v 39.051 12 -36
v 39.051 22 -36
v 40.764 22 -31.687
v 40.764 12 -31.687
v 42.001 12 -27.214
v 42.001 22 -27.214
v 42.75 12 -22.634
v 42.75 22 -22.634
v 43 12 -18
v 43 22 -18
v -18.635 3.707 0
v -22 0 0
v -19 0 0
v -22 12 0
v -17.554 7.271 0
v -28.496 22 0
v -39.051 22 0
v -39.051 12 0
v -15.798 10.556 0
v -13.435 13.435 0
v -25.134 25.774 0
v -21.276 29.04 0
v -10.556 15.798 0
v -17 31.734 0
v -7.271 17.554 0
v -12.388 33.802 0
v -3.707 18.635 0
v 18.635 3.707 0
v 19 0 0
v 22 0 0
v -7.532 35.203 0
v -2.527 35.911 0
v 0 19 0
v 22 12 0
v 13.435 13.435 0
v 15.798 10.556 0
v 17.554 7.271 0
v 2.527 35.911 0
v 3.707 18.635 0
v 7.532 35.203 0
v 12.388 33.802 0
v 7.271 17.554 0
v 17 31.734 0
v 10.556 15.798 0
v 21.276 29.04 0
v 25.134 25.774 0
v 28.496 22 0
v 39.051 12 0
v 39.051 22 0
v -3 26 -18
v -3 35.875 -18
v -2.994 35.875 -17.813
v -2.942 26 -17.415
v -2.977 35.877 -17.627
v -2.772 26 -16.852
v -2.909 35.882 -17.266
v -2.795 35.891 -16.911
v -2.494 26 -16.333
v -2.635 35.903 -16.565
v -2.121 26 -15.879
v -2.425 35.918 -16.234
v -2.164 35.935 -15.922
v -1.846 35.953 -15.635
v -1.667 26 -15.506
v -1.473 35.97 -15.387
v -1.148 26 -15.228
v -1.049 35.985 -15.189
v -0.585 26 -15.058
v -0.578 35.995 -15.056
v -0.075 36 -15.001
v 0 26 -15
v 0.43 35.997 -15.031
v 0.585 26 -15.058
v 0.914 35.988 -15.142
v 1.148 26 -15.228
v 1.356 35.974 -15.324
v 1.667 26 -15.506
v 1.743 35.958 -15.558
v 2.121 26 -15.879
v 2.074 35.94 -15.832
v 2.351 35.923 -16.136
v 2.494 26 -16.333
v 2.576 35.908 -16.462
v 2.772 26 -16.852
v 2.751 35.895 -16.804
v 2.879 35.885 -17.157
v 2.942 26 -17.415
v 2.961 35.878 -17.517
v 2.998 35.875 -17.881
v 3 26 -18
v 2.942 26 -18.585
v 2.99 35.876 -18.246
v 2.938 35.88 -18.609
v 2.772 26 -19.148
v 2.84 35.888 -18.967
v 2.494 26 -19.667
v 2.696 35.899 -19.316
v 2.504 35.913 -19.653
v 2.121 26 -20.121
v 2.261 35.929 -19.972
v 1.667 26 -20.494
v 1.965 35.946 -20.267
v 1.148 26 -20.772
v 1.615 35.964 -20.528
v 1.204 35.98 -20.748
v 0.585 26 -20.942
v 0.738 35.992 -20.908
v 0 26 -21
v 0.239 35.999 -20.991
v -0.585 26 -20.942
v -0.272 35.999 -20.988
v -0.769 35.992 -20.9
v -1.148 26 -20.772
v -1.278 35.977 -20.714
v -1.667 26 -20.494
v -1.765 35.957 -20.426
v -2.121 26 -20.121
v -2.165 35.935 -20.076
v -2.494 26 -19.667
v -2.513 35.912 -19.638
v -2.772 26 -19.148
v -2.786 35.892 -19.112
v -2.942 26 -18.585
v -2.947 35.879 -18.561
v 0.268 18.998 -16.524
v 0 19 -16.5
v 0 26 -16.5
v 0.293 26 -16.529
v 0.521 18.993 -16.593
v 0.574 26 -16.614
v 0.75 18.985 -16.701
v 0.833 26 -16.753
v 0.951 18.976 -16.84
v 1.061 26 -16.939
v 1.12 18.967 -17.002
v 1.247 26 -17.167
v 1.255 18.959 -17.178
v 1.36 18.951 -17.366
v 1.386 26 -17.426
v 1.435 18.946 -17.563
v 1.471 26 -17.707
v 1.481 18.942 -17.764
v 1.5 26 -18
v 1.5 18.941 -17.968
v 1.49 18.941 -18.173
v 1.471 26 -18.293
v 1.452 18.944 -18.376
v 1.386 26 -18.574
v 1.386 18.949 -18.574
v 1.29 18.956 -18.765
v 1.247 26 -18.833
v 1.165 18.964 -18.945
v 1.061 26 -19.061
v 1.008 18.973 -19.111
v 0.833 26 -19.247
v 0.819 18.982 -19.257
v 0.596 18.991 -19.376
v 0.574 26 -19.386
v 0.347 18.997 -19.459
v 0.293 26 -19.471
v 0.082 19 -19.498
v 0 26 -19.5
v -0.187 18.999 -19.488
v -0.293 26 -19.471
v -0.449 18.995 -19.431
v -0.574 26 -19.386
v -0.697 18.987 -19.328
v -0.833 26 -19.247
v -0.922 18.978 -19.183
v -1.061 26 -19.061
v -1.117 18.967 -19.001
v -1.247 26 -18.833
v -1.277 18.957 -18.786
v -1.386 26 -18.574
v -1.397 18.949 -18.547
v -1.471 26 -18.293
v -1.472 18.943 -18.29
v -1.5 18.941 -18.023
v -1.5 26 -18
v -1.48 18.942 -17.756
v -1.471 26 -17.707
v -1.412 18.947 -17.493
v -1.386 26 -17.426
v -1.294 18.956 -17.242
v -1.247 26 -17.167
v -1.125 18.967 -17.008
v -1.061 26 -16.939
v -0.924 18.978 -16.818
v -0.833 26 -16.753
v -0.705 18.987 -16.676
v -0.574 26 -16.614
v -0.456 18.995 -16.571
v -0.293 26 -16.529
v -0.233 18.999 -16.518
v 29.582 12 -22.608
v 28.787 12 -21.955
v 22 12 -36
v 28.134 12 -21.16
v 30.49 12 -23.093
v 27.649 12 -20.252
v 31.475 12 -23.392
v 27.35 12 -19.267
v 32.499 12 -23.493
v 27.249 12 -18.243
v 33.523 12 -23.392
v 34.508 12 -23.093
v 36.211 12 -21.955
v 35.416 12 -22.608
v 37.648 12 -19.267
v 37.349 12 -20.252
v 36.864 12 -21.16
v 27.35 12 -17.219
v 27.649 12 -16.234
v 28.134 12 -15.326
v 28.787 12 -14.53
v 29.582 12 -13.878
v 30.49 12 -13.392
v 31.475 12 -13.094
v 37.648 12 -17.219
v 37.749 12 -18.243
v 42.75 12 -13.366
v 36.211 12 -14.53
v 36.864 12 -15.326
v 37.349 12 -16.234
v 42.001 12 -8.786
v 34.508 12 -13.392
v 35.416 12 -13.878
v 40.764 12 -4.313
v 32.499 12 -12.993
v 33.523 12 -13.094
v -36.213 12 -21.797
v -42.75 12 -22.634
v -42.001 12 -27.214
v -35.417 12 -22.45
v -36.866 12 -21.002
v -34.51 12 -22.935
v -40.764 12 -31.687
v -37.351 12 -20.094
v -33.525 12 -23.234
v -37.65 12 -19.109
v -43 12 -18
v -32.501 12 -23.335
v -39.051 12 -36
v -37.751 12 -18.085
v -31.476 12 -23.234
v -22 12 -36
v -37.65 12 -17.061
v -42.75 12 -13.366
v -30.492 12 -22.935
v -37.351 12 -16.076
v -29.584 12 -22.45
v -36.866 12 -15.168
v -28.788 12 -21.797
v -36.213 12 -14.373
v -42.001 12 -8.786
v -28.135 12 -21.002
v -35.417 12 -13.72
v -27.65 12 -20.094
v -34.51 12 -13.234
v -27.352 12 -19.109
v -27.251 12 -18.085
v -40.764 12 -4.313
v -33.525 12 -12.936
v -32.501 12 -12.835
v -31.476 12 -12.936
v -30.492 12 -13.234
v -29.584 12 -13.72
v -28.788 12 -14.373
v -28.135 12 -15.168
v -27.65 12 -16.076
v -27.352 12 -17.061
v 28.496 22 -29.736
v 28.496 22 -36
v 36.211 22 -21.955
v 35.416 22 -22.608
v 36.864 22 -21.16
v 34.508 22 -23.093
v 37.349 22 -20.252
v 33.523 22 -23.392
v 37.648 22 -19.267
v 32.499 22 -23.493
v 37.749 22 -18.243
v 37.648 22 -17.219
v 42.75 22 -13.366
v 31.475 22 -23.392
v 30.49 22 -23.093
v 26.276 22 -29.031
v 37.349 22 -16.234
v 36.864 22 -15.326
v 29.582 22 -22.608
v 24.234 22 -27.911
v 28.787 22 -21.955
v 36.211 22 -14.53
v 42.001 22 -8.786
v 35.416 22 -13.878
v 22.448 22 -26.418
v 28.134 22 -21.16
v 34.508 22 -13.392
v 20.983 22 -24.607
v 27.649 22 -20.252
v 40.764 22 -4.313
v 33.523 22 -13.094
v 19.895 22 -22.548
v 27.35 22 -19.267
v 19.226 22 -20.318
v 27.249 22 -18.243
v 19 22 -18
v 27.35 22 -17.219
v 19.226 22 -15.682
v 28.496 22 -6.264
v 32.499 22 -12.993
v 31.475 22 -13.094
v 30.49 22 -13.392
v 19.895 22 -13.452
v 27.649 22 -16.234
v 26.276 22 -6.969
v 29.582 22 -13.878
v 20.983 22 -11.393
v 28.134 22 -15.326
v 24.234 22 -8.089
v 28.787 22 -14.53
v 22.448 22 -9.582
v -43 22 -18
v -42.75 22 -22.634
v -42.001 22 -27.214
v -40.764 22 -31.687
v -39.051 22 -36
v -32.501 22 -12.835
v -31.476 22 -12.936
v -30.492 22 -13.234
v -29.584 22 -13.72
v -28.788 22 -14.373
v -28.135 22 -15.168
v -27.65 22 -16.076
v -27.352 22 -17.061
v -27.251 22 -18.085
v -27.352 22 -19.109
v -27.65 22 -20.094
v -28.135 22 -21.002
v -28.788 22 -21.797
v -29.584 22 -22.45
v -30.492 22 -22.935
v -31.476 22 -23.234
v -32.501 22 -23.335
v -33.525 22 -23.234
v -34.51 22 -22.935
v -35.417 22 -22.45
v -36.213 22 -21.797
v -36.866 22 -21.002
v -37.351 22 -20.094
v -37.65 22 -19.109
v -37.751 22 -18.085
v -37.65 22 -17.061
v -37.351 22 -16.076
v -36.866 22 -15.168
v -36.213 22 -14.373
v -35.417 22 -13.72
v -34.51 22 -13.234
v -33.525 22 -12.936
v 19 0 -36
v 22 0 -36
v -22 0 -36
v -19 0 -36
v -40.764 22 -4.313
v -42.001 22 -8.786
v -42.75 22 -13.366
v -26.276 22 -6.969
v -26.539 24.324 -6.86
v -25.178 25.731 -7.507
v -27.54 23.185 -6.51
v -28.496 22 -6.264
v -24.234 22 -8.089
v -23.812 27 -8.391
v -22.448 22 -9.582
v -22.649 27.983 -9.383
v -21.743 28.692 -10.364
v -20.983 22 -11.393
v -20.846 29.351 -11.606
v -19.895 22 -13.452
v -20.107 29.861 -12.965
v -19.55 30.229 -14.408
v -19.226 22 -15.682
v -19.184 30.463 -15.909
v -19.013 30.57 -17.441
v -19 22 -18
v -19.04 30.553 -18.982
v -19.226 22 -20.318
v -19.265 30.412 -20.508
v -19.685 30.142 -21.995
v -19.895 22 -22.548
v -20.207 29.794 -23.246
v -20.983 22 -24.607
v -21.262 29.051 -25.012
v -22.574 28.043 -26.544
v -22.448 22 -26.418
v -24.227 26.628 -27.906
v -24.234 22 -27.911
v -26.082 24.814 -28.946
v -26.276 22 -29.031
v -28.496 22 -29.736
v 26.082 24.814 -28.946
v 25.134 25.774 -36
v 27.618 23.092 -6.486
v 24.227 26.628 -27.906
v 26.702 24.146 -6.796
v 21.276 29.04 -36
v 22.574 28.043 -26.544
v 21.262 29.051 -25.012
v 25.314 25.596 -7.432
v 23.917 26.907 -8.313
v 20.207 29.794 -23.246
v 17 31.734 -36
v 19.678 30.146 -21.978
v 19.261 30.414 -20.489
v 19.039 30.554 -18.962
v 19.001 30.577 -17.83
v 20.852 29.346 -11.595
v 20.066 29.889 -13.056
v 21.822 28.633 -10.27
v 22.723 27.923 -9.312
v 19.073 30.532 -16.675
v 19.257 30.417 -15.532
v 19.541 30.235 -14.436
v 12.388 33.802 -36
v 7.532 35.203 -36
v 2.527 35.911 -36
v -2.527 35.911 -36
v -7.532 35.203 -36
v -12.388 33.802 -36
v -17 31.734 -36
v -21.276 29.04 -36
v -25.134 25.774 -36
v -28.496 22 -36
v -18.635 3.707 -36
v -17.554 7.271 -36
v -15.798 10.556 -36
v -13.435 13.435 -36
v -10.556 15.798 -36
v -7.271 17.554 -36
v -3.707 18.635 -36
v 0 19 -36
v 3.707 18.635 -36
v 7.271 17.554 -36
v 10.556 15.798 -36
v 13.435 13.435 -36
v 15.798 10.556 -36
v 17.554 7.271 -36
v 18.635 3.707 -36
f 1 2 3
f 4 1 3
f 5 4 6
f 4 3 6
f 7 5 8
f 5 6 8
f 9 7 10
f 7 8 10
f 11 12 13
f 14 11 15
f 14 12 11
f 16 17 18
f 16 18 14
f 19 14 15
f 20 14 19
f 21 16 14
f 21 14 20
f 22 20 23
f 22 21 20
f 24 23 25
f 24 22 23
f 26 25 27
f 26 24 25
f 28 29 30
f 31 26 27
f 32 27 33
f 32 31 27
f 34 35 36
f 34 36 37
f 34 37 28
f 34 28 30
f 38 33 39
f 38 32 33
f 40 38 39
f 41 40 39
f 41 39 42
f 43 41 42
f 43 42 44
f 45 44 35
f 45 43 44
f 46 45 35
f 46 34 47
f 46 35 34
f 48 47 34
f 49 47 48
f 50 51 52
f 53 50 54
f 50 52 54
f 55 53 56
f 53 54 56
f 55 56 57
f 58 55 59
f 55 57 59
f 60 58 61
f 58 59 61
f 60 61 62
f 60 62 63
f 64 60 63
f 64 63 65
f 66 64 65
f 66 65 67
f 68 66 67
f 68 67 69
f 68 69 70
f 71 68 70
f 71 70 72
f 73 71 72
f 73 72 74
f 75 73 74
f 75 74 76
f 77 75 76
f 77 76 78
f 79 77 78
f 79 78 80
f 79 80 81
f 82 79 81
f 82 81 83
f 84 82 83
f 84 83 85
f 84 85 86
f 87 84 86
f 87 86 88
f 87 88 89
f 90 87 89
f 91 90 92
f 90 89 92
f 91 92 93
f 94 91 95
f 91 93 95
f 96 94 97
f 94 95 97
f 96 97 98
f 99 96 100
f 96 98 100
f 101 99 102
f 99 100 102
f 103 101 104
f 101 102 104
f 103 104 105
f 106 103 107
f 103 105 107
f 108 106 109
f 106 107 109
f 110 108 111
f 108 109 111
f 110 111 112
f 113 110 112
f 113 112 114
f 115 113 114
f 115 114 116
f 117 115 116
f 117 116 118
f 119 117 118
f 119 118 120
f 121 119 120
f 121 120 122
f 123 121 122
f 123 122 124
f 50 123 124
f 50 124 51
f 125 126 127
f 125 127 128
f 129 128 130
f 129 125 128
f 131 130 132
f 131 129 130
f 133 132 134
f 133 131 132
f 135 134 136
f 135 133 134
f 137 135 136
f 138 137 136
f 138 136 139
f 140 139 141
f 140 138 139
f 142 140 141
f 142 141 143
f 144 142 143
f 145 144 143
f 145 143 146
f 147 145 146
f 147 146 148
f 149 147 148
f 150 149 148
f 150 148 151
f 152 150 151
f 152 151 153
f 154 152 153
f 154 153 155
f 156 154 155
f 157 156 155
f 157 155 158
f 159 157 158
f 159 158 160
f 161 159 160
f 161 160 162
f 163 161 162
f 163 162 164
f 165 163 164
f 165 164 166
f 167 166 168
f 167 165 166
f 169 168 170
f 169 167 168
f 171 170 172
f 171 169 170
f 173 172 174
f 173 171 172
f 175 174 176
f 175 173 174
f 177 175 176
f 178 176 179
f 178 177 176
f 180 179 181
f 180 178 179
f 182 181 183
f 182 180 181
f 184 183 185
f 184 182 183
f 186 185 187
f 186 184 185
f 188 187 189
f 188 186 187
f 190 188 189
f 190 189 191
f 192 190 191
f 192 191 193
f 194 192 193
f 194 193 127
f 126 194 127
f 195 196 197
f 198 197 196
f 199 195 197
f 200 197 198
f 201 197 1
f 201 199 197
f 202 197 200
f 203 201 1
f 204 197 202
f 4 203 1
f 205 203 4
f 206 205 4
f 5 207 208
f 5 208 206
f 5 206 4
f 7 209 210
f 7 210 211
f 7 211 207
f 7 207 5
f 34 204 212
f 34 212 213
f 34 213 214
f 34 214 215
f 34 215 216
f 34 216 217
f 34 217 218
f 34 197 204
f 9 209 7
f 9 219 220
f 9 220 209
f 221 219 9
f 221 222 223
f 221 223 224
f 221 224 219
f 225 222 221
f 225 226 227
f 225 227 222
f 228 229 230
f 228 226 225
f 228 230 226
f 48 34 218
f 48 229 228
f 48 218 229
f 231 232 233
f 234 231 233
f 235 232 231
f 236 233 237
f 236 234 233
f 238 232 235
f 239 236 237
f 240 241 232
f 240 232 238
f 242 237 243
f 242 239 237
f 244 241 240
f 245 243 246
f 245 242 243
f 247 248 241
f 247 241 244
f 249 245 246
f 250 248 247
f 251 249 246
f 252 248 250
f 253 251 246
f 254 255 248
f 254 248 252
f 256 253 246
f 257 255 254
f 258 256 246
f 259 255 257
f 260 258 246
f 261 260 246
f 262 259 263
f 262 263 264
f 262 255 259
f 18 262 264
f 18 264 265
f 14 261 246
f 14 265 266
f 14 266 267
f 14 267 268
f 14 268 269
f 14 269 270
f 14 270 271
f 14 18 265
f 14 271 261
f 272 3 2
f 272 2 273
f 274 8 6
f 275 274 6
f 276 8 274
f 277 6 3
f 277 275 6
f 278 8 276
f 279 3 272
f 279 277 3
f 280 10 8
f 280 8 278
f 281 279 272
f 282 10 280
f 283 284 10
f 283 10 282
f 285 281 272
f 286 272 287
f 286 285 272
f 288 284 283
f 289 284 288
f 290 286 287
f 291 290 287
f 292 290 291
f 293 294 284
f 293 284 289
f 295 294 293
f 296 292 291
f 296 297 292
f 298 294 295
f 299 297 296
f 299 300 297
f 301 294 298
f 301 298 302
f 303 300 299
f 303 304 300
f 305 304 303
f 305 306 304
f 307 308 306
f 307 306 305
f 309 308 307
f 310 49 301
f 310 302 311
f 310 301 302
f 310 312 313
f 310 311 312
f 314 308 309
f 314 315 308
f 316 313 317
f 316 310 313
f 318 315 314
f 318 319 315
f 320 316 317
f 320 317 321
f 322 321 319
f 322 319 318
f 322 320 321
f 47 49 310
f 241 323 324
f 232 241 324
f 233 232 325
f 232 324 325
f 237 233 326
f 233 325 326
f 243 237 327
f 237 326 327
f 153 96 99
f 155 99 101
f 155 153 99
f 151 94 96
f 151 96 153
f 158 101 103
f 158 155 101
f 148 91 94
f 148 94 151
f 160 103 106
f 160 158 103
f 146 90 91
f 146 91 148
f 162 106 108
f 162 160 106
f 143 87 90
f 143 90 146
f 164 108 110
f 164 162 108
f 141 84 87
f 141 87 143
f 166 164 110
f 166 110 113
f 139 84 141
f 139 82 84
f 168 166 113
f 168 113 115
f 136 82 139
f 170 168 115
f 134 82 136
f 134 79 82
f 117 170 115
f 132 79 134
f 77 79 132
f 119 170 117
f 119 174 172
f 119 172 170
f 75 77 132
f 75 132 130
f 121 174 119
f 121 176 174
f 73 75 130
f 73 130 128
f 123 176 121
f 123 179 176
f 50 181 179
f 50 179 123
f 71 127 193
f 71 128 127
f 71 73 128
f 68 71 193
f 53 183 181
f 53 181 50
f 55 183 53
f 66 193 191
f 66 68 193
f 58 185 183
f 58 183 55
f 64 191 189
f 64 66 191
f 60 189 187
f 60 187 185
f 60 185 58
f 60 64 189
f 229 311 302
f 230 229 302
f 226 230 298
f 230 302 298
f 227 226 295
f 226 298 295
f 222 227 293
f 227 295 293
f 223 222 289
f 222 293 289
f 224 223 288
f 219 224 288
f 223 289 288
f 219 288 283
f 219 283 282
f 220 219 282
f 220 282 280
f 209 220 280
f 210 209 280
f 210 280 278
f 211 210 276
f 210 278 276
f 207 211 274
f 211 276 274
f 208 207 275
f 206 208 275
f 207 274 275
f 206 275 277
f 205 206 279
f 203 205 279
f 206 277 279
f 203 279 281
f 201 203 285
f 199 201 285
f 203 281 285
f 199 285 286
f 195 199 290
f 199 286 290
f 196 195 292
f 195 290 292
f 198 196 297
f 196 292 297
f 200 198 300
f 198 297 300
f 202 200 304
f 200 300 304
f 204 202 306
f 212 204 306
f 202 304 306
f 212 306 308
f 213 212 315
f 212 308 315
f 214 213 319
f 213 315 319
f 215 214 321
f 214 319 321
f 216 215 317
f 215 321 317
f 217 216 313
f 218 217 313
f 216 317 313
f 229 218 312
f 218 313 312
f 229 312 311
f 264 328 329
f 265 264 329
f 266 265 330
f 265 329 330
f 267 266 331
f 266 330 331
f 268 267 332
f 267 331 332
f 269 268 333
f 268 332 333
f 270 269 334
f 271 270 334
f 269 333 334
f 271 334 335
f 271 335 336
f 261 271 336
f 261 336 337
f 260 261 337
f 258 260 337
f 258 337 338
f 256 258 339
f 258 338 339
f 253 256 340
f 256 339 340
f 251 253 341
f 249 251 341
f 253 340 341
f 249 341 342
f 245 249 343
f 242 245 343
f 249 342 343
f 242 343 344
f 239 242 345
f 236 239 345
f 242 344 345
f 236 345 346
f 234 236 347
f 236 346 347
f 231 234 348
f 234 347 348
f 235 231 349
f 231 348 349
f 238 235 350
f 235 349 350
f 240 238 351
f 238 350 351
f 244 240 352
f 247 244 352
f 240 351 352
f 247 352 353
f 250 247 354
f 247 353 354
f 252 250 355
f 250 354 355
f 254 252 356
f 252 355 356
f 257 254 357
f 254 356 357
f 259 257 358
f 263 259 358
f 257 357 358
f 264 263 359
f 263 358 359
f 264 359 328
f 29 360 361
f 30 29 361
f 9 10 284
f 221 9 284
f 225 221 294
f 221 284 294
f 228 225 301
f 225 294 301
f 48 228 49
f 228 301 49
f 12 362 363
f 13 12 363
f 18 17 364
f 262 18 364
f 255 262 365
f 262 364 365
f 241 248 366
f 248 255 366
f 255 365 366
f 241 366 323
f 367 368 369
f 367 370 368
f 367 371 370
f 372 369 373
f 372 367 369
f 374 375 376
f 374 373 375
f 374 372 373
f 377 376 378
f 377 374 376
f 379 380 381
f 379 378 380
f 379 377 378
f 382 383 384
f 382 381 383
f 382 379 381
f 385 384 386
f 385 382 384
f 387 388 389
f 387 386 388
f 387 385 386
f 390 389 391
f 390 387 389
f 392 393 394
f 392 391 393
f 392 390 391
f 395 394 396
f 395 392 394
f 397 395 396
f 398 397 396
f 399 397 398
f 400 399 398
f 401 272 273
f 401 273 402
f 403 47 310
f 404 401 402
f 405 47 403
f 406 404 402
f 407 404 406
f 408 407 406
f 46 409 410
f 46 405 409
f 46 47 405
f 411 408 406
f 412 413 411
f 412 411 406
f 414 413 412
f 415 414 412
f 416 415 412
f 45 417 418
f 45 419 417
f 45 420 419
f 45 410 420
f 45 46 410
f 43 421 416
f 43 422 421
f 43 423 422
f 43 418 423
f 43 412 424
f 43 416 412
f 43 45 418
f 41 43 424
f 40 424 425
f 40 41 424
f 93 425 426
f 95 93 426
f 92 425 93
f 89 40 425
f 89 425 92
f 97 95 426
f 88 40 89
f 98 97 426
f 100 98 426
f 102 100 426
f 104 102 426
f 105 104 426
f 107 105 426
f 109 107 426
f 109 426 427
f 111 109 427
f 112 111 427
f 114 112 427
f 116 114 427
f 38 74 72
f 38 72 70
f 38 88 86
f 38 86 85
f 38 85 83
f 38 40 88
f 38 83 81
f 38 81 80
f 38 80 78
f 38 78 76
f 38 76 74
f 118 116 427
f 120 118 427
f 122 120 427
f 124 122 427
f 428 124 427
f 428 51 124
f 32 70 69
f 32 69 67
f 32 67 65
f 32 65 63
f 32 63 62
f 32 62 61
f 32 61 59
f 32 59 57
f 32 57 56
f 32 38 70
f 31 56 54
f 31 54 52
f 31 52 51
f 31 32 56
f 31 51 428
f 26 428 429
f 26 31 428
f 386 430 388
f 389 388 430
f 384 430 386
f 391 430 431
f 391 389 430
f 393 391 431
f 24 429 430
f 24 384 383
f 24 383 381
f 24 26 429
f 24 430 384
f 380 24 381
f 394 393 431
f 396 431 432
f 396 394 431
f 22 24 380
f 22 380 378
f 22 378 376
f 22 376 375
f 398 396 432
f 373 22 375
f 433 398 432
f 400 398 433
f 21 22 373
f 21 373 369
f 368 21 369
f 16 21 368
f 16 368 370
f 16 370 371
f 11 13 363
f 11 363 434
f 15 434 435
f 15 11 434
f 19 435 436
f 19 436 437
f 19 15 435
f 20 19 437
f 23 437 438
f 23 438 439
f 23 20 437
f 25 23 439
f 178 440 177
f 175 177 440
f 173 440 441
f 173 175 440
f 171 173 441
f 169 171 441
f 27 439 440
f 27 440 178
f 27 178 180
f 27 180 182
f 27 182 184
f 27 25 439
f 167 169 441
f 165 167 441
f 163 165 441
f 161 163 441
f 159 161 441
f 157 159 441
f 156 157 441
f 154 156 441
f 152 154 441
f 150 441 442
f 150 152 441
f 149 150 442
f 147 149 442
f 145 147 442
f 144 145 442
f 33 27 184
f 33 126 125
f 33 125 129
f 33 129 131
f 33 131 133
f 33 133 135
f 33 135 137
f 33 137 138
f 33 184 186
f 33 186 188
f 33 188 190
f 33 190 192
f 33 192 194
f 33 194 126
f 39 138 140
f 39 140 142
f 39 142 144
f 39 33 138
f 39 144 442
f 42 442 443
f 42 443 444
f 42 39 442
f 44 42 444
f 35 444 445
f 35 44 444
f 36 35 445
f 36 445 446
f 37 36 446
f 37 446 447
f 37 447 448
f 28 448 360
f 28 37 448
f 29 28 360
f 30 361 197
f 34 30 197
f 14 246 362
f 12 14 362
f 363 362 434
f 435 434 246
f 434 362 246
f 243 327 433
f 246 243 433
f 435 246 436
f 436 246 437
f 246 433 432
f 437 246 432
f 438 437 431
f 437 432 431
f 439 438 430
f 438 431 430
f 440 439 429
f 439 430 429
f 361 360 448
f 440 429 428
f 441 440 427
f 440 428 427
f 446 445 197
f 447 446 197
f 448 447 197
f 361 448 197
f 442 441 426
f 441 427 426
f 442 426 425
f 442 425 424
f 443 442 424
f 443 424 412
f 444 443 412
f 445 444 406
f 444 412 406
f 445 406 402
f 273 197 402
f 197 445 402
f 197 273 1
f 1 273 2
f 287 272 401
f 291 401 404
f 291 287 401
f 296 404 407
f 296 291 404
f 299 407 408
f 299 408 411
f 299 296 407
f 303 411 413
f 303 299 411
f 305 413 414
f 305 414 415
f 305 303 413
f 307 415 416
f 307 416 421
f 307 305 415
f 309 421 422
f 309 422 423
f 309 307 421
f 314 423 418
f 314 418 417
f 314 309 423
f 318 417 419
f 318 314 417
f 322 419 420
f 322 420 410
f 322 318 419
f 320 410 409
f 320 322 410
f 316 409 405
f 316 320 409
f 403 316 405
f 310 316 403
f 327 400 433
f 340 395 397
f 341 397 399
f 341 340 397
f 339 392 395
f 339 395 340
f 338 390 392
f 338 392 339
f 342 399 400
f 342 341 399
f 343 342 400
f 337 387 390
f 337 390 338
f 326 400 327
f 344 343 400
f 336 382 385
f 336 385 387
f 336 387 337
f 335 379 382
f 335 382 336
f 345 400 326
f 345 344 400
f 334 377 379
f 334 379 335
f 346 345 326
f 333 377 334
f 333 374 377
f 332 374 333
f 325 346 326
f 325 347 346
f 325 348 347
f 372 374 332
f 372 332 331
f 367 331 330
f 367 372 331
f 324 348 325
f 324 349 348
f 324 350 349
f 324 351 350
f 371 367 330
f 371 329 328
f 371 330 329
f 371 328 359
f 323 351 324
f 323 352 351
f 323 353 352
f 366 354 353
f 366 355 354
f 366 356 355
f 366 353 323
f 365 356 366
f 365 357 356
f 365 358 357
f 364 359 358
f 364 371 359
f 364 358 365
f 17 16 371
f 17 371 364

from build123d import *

# Parameters (mm, degrees)
BOSS_EXTRUDE1_DEPTH      = 36
CUT_EXTRUDE1_DEPTH       = 36
SKETCH3_R                = 12
CUT_EXTRUDE10_DEPTH      = 61.241181927
SKETCH10_R               = 3
CUT_EXTRUDE12_DEPTH      = 10
CUT_EXTRUDE13_DEPTH      = 61.241181987
CUT_EXTRUDE13_DEPTH_BACK = 61.241181987
SKETCH11_R               = 1.5
SKETCH9_R                = 5.25
CUT_EXTRUDE14_DEPTH      = 10


with BuildPart() as part:
    # Sketch1 → Boss-Extrude1 (new body)
    with BuildSketch(Plane.XY):
        with BuildLine():
            Line((-22, 0), (-19, 0))
            ThreePointArc((-19, 0), (0, 19), (19, 0))
            Line((19, 0), (22, 0))
            Line((22, 0), (22, 12))
            Line((22, 12), (43, 12))
            Line((43, 12), (43, 22))
            Line((43, 22), (28.495613698, 22))
            ThreePointArc((28.495613698, 22), (0, 36), (-28.495613698, 22))
            Line((-28.495613698, 22), (-43, 22))
            Line((-43, 22), (-43, 12))
            Line((-43, 12), (-22, 12))
            Line((-22, 12), (-22, 0))
        make_face()
    extrude(amount=-BOSS_EXTRUDE1_DEPTH)

    # Sketch2 → Cut-Extrude1 (cut)
    with BuildSketch(Plane(origin=(0, 22, 0), x_dir=(1, 0, 0), z_dir=(0, 1, 0))):
        with BuildLine():
            Line((-39.05124838, 36), (-43, 36))
            Line((-43, 36), (-43, 18))
            ThreePointArc((-43, 18), (-42.001212365, 27.214019744), (-39.05124838, 36))
        make_face()
        with BuildLine():
            ThreePointArc((-39.05124838, 0), (-42.001212365, 8.785980256), (-43, 18))
            Line((-43, 18), (-43, 0))
            Line((-43, 0), (-39.05124838, 0))
        make_face()
        with BuildLine():
            Line((43, 36), (39.05124838, 36))
            ThreePointArc((39.05124838, 36), (42.001212365, 27.214019744), (43, 18))
            Line((43, 18), (43, 36))
        make_face()
        with BuildLine():
            Line((43, 0), (43, 18))
            ThreePointArc((43, 18), (42.001212365, 8.785980256), (39.05124838, 0))
            Line((39.05124838, 0), (43, 0))
        make_face()
    extrude(amount=-CUT_EXTRUDE1_DEPTH, mode=Mode.SUBTRACT)

    # Sketch3 → Cut-Extrude10 (cut, through all)
    with BuildSketch(Plane(origin=(0, 22, 0), x_dir=(1, 0, 0), z_dir=(0, 1, 0))):
        with Locations((-31, 18)):
            Circle(SKETCH3_R)
        with Locations((31, 18)):
            Circle(SKETCH3_R)
    extrude(amount=CUT_EXTRUDE10_DEPTH, mode=Mode.SUBTRACT)

    # Sketch10 → Cut-Extrude12 (cut)
    with BuildSketch(Plane(origin=(0, 36, 0), x_dir=(1, 0, 0), z_dir=(0, 1, 0))):
        with Locations(Location((0, 18, 0), (0, 0, 180))):
            Circle(SKETCH10_R)
    extrude(amount=-CUT_EXTRUDE12_DEPTH, mode=Mode.SUBTRACT)

    # Sketch11 → Cut-Extrude13 (cut, two sides: drawn at the far end of the back side and taken through both)
    with BuildSketch(Plane(origin=(0, 22, 0), x_dir=(1, 0, 0), z_dir=(0, 1, 0)).offset(-CUT_EXTRUDE13_DEPTH_BACK)):
        with Locations(Location((0, 18, 0), (0, 0, 270))):
            Circle(SKETCH11_R)
    extrude(amount=CUT_EXTRUDE13_DEPTH + CUT_EXTRUDE13_DEPTH_BACK, mode=Mode.SUBTRACT)

    # Sketch9 → Cut-Extrude14 (cut)
    with BuildSketch(Plane(origin=(0, 22, 0), x_dir=(1, 0, 0), z_dir=(0, 1, 0))):
        with Locations(Location((-32.500715047, 18.084858078, 0), (0, 0, 270))):
            Circle(SKETCH9_R)
        with Locations(Location((32.499093077, 18.242794562, 0), (0, 0, 270))):
            Circle(SKETCH9_R)
    extrude(amount=-CUT_EXTRUDE14_DEPTH, mode=Mode.SUBTRACT)


solid = part.part
